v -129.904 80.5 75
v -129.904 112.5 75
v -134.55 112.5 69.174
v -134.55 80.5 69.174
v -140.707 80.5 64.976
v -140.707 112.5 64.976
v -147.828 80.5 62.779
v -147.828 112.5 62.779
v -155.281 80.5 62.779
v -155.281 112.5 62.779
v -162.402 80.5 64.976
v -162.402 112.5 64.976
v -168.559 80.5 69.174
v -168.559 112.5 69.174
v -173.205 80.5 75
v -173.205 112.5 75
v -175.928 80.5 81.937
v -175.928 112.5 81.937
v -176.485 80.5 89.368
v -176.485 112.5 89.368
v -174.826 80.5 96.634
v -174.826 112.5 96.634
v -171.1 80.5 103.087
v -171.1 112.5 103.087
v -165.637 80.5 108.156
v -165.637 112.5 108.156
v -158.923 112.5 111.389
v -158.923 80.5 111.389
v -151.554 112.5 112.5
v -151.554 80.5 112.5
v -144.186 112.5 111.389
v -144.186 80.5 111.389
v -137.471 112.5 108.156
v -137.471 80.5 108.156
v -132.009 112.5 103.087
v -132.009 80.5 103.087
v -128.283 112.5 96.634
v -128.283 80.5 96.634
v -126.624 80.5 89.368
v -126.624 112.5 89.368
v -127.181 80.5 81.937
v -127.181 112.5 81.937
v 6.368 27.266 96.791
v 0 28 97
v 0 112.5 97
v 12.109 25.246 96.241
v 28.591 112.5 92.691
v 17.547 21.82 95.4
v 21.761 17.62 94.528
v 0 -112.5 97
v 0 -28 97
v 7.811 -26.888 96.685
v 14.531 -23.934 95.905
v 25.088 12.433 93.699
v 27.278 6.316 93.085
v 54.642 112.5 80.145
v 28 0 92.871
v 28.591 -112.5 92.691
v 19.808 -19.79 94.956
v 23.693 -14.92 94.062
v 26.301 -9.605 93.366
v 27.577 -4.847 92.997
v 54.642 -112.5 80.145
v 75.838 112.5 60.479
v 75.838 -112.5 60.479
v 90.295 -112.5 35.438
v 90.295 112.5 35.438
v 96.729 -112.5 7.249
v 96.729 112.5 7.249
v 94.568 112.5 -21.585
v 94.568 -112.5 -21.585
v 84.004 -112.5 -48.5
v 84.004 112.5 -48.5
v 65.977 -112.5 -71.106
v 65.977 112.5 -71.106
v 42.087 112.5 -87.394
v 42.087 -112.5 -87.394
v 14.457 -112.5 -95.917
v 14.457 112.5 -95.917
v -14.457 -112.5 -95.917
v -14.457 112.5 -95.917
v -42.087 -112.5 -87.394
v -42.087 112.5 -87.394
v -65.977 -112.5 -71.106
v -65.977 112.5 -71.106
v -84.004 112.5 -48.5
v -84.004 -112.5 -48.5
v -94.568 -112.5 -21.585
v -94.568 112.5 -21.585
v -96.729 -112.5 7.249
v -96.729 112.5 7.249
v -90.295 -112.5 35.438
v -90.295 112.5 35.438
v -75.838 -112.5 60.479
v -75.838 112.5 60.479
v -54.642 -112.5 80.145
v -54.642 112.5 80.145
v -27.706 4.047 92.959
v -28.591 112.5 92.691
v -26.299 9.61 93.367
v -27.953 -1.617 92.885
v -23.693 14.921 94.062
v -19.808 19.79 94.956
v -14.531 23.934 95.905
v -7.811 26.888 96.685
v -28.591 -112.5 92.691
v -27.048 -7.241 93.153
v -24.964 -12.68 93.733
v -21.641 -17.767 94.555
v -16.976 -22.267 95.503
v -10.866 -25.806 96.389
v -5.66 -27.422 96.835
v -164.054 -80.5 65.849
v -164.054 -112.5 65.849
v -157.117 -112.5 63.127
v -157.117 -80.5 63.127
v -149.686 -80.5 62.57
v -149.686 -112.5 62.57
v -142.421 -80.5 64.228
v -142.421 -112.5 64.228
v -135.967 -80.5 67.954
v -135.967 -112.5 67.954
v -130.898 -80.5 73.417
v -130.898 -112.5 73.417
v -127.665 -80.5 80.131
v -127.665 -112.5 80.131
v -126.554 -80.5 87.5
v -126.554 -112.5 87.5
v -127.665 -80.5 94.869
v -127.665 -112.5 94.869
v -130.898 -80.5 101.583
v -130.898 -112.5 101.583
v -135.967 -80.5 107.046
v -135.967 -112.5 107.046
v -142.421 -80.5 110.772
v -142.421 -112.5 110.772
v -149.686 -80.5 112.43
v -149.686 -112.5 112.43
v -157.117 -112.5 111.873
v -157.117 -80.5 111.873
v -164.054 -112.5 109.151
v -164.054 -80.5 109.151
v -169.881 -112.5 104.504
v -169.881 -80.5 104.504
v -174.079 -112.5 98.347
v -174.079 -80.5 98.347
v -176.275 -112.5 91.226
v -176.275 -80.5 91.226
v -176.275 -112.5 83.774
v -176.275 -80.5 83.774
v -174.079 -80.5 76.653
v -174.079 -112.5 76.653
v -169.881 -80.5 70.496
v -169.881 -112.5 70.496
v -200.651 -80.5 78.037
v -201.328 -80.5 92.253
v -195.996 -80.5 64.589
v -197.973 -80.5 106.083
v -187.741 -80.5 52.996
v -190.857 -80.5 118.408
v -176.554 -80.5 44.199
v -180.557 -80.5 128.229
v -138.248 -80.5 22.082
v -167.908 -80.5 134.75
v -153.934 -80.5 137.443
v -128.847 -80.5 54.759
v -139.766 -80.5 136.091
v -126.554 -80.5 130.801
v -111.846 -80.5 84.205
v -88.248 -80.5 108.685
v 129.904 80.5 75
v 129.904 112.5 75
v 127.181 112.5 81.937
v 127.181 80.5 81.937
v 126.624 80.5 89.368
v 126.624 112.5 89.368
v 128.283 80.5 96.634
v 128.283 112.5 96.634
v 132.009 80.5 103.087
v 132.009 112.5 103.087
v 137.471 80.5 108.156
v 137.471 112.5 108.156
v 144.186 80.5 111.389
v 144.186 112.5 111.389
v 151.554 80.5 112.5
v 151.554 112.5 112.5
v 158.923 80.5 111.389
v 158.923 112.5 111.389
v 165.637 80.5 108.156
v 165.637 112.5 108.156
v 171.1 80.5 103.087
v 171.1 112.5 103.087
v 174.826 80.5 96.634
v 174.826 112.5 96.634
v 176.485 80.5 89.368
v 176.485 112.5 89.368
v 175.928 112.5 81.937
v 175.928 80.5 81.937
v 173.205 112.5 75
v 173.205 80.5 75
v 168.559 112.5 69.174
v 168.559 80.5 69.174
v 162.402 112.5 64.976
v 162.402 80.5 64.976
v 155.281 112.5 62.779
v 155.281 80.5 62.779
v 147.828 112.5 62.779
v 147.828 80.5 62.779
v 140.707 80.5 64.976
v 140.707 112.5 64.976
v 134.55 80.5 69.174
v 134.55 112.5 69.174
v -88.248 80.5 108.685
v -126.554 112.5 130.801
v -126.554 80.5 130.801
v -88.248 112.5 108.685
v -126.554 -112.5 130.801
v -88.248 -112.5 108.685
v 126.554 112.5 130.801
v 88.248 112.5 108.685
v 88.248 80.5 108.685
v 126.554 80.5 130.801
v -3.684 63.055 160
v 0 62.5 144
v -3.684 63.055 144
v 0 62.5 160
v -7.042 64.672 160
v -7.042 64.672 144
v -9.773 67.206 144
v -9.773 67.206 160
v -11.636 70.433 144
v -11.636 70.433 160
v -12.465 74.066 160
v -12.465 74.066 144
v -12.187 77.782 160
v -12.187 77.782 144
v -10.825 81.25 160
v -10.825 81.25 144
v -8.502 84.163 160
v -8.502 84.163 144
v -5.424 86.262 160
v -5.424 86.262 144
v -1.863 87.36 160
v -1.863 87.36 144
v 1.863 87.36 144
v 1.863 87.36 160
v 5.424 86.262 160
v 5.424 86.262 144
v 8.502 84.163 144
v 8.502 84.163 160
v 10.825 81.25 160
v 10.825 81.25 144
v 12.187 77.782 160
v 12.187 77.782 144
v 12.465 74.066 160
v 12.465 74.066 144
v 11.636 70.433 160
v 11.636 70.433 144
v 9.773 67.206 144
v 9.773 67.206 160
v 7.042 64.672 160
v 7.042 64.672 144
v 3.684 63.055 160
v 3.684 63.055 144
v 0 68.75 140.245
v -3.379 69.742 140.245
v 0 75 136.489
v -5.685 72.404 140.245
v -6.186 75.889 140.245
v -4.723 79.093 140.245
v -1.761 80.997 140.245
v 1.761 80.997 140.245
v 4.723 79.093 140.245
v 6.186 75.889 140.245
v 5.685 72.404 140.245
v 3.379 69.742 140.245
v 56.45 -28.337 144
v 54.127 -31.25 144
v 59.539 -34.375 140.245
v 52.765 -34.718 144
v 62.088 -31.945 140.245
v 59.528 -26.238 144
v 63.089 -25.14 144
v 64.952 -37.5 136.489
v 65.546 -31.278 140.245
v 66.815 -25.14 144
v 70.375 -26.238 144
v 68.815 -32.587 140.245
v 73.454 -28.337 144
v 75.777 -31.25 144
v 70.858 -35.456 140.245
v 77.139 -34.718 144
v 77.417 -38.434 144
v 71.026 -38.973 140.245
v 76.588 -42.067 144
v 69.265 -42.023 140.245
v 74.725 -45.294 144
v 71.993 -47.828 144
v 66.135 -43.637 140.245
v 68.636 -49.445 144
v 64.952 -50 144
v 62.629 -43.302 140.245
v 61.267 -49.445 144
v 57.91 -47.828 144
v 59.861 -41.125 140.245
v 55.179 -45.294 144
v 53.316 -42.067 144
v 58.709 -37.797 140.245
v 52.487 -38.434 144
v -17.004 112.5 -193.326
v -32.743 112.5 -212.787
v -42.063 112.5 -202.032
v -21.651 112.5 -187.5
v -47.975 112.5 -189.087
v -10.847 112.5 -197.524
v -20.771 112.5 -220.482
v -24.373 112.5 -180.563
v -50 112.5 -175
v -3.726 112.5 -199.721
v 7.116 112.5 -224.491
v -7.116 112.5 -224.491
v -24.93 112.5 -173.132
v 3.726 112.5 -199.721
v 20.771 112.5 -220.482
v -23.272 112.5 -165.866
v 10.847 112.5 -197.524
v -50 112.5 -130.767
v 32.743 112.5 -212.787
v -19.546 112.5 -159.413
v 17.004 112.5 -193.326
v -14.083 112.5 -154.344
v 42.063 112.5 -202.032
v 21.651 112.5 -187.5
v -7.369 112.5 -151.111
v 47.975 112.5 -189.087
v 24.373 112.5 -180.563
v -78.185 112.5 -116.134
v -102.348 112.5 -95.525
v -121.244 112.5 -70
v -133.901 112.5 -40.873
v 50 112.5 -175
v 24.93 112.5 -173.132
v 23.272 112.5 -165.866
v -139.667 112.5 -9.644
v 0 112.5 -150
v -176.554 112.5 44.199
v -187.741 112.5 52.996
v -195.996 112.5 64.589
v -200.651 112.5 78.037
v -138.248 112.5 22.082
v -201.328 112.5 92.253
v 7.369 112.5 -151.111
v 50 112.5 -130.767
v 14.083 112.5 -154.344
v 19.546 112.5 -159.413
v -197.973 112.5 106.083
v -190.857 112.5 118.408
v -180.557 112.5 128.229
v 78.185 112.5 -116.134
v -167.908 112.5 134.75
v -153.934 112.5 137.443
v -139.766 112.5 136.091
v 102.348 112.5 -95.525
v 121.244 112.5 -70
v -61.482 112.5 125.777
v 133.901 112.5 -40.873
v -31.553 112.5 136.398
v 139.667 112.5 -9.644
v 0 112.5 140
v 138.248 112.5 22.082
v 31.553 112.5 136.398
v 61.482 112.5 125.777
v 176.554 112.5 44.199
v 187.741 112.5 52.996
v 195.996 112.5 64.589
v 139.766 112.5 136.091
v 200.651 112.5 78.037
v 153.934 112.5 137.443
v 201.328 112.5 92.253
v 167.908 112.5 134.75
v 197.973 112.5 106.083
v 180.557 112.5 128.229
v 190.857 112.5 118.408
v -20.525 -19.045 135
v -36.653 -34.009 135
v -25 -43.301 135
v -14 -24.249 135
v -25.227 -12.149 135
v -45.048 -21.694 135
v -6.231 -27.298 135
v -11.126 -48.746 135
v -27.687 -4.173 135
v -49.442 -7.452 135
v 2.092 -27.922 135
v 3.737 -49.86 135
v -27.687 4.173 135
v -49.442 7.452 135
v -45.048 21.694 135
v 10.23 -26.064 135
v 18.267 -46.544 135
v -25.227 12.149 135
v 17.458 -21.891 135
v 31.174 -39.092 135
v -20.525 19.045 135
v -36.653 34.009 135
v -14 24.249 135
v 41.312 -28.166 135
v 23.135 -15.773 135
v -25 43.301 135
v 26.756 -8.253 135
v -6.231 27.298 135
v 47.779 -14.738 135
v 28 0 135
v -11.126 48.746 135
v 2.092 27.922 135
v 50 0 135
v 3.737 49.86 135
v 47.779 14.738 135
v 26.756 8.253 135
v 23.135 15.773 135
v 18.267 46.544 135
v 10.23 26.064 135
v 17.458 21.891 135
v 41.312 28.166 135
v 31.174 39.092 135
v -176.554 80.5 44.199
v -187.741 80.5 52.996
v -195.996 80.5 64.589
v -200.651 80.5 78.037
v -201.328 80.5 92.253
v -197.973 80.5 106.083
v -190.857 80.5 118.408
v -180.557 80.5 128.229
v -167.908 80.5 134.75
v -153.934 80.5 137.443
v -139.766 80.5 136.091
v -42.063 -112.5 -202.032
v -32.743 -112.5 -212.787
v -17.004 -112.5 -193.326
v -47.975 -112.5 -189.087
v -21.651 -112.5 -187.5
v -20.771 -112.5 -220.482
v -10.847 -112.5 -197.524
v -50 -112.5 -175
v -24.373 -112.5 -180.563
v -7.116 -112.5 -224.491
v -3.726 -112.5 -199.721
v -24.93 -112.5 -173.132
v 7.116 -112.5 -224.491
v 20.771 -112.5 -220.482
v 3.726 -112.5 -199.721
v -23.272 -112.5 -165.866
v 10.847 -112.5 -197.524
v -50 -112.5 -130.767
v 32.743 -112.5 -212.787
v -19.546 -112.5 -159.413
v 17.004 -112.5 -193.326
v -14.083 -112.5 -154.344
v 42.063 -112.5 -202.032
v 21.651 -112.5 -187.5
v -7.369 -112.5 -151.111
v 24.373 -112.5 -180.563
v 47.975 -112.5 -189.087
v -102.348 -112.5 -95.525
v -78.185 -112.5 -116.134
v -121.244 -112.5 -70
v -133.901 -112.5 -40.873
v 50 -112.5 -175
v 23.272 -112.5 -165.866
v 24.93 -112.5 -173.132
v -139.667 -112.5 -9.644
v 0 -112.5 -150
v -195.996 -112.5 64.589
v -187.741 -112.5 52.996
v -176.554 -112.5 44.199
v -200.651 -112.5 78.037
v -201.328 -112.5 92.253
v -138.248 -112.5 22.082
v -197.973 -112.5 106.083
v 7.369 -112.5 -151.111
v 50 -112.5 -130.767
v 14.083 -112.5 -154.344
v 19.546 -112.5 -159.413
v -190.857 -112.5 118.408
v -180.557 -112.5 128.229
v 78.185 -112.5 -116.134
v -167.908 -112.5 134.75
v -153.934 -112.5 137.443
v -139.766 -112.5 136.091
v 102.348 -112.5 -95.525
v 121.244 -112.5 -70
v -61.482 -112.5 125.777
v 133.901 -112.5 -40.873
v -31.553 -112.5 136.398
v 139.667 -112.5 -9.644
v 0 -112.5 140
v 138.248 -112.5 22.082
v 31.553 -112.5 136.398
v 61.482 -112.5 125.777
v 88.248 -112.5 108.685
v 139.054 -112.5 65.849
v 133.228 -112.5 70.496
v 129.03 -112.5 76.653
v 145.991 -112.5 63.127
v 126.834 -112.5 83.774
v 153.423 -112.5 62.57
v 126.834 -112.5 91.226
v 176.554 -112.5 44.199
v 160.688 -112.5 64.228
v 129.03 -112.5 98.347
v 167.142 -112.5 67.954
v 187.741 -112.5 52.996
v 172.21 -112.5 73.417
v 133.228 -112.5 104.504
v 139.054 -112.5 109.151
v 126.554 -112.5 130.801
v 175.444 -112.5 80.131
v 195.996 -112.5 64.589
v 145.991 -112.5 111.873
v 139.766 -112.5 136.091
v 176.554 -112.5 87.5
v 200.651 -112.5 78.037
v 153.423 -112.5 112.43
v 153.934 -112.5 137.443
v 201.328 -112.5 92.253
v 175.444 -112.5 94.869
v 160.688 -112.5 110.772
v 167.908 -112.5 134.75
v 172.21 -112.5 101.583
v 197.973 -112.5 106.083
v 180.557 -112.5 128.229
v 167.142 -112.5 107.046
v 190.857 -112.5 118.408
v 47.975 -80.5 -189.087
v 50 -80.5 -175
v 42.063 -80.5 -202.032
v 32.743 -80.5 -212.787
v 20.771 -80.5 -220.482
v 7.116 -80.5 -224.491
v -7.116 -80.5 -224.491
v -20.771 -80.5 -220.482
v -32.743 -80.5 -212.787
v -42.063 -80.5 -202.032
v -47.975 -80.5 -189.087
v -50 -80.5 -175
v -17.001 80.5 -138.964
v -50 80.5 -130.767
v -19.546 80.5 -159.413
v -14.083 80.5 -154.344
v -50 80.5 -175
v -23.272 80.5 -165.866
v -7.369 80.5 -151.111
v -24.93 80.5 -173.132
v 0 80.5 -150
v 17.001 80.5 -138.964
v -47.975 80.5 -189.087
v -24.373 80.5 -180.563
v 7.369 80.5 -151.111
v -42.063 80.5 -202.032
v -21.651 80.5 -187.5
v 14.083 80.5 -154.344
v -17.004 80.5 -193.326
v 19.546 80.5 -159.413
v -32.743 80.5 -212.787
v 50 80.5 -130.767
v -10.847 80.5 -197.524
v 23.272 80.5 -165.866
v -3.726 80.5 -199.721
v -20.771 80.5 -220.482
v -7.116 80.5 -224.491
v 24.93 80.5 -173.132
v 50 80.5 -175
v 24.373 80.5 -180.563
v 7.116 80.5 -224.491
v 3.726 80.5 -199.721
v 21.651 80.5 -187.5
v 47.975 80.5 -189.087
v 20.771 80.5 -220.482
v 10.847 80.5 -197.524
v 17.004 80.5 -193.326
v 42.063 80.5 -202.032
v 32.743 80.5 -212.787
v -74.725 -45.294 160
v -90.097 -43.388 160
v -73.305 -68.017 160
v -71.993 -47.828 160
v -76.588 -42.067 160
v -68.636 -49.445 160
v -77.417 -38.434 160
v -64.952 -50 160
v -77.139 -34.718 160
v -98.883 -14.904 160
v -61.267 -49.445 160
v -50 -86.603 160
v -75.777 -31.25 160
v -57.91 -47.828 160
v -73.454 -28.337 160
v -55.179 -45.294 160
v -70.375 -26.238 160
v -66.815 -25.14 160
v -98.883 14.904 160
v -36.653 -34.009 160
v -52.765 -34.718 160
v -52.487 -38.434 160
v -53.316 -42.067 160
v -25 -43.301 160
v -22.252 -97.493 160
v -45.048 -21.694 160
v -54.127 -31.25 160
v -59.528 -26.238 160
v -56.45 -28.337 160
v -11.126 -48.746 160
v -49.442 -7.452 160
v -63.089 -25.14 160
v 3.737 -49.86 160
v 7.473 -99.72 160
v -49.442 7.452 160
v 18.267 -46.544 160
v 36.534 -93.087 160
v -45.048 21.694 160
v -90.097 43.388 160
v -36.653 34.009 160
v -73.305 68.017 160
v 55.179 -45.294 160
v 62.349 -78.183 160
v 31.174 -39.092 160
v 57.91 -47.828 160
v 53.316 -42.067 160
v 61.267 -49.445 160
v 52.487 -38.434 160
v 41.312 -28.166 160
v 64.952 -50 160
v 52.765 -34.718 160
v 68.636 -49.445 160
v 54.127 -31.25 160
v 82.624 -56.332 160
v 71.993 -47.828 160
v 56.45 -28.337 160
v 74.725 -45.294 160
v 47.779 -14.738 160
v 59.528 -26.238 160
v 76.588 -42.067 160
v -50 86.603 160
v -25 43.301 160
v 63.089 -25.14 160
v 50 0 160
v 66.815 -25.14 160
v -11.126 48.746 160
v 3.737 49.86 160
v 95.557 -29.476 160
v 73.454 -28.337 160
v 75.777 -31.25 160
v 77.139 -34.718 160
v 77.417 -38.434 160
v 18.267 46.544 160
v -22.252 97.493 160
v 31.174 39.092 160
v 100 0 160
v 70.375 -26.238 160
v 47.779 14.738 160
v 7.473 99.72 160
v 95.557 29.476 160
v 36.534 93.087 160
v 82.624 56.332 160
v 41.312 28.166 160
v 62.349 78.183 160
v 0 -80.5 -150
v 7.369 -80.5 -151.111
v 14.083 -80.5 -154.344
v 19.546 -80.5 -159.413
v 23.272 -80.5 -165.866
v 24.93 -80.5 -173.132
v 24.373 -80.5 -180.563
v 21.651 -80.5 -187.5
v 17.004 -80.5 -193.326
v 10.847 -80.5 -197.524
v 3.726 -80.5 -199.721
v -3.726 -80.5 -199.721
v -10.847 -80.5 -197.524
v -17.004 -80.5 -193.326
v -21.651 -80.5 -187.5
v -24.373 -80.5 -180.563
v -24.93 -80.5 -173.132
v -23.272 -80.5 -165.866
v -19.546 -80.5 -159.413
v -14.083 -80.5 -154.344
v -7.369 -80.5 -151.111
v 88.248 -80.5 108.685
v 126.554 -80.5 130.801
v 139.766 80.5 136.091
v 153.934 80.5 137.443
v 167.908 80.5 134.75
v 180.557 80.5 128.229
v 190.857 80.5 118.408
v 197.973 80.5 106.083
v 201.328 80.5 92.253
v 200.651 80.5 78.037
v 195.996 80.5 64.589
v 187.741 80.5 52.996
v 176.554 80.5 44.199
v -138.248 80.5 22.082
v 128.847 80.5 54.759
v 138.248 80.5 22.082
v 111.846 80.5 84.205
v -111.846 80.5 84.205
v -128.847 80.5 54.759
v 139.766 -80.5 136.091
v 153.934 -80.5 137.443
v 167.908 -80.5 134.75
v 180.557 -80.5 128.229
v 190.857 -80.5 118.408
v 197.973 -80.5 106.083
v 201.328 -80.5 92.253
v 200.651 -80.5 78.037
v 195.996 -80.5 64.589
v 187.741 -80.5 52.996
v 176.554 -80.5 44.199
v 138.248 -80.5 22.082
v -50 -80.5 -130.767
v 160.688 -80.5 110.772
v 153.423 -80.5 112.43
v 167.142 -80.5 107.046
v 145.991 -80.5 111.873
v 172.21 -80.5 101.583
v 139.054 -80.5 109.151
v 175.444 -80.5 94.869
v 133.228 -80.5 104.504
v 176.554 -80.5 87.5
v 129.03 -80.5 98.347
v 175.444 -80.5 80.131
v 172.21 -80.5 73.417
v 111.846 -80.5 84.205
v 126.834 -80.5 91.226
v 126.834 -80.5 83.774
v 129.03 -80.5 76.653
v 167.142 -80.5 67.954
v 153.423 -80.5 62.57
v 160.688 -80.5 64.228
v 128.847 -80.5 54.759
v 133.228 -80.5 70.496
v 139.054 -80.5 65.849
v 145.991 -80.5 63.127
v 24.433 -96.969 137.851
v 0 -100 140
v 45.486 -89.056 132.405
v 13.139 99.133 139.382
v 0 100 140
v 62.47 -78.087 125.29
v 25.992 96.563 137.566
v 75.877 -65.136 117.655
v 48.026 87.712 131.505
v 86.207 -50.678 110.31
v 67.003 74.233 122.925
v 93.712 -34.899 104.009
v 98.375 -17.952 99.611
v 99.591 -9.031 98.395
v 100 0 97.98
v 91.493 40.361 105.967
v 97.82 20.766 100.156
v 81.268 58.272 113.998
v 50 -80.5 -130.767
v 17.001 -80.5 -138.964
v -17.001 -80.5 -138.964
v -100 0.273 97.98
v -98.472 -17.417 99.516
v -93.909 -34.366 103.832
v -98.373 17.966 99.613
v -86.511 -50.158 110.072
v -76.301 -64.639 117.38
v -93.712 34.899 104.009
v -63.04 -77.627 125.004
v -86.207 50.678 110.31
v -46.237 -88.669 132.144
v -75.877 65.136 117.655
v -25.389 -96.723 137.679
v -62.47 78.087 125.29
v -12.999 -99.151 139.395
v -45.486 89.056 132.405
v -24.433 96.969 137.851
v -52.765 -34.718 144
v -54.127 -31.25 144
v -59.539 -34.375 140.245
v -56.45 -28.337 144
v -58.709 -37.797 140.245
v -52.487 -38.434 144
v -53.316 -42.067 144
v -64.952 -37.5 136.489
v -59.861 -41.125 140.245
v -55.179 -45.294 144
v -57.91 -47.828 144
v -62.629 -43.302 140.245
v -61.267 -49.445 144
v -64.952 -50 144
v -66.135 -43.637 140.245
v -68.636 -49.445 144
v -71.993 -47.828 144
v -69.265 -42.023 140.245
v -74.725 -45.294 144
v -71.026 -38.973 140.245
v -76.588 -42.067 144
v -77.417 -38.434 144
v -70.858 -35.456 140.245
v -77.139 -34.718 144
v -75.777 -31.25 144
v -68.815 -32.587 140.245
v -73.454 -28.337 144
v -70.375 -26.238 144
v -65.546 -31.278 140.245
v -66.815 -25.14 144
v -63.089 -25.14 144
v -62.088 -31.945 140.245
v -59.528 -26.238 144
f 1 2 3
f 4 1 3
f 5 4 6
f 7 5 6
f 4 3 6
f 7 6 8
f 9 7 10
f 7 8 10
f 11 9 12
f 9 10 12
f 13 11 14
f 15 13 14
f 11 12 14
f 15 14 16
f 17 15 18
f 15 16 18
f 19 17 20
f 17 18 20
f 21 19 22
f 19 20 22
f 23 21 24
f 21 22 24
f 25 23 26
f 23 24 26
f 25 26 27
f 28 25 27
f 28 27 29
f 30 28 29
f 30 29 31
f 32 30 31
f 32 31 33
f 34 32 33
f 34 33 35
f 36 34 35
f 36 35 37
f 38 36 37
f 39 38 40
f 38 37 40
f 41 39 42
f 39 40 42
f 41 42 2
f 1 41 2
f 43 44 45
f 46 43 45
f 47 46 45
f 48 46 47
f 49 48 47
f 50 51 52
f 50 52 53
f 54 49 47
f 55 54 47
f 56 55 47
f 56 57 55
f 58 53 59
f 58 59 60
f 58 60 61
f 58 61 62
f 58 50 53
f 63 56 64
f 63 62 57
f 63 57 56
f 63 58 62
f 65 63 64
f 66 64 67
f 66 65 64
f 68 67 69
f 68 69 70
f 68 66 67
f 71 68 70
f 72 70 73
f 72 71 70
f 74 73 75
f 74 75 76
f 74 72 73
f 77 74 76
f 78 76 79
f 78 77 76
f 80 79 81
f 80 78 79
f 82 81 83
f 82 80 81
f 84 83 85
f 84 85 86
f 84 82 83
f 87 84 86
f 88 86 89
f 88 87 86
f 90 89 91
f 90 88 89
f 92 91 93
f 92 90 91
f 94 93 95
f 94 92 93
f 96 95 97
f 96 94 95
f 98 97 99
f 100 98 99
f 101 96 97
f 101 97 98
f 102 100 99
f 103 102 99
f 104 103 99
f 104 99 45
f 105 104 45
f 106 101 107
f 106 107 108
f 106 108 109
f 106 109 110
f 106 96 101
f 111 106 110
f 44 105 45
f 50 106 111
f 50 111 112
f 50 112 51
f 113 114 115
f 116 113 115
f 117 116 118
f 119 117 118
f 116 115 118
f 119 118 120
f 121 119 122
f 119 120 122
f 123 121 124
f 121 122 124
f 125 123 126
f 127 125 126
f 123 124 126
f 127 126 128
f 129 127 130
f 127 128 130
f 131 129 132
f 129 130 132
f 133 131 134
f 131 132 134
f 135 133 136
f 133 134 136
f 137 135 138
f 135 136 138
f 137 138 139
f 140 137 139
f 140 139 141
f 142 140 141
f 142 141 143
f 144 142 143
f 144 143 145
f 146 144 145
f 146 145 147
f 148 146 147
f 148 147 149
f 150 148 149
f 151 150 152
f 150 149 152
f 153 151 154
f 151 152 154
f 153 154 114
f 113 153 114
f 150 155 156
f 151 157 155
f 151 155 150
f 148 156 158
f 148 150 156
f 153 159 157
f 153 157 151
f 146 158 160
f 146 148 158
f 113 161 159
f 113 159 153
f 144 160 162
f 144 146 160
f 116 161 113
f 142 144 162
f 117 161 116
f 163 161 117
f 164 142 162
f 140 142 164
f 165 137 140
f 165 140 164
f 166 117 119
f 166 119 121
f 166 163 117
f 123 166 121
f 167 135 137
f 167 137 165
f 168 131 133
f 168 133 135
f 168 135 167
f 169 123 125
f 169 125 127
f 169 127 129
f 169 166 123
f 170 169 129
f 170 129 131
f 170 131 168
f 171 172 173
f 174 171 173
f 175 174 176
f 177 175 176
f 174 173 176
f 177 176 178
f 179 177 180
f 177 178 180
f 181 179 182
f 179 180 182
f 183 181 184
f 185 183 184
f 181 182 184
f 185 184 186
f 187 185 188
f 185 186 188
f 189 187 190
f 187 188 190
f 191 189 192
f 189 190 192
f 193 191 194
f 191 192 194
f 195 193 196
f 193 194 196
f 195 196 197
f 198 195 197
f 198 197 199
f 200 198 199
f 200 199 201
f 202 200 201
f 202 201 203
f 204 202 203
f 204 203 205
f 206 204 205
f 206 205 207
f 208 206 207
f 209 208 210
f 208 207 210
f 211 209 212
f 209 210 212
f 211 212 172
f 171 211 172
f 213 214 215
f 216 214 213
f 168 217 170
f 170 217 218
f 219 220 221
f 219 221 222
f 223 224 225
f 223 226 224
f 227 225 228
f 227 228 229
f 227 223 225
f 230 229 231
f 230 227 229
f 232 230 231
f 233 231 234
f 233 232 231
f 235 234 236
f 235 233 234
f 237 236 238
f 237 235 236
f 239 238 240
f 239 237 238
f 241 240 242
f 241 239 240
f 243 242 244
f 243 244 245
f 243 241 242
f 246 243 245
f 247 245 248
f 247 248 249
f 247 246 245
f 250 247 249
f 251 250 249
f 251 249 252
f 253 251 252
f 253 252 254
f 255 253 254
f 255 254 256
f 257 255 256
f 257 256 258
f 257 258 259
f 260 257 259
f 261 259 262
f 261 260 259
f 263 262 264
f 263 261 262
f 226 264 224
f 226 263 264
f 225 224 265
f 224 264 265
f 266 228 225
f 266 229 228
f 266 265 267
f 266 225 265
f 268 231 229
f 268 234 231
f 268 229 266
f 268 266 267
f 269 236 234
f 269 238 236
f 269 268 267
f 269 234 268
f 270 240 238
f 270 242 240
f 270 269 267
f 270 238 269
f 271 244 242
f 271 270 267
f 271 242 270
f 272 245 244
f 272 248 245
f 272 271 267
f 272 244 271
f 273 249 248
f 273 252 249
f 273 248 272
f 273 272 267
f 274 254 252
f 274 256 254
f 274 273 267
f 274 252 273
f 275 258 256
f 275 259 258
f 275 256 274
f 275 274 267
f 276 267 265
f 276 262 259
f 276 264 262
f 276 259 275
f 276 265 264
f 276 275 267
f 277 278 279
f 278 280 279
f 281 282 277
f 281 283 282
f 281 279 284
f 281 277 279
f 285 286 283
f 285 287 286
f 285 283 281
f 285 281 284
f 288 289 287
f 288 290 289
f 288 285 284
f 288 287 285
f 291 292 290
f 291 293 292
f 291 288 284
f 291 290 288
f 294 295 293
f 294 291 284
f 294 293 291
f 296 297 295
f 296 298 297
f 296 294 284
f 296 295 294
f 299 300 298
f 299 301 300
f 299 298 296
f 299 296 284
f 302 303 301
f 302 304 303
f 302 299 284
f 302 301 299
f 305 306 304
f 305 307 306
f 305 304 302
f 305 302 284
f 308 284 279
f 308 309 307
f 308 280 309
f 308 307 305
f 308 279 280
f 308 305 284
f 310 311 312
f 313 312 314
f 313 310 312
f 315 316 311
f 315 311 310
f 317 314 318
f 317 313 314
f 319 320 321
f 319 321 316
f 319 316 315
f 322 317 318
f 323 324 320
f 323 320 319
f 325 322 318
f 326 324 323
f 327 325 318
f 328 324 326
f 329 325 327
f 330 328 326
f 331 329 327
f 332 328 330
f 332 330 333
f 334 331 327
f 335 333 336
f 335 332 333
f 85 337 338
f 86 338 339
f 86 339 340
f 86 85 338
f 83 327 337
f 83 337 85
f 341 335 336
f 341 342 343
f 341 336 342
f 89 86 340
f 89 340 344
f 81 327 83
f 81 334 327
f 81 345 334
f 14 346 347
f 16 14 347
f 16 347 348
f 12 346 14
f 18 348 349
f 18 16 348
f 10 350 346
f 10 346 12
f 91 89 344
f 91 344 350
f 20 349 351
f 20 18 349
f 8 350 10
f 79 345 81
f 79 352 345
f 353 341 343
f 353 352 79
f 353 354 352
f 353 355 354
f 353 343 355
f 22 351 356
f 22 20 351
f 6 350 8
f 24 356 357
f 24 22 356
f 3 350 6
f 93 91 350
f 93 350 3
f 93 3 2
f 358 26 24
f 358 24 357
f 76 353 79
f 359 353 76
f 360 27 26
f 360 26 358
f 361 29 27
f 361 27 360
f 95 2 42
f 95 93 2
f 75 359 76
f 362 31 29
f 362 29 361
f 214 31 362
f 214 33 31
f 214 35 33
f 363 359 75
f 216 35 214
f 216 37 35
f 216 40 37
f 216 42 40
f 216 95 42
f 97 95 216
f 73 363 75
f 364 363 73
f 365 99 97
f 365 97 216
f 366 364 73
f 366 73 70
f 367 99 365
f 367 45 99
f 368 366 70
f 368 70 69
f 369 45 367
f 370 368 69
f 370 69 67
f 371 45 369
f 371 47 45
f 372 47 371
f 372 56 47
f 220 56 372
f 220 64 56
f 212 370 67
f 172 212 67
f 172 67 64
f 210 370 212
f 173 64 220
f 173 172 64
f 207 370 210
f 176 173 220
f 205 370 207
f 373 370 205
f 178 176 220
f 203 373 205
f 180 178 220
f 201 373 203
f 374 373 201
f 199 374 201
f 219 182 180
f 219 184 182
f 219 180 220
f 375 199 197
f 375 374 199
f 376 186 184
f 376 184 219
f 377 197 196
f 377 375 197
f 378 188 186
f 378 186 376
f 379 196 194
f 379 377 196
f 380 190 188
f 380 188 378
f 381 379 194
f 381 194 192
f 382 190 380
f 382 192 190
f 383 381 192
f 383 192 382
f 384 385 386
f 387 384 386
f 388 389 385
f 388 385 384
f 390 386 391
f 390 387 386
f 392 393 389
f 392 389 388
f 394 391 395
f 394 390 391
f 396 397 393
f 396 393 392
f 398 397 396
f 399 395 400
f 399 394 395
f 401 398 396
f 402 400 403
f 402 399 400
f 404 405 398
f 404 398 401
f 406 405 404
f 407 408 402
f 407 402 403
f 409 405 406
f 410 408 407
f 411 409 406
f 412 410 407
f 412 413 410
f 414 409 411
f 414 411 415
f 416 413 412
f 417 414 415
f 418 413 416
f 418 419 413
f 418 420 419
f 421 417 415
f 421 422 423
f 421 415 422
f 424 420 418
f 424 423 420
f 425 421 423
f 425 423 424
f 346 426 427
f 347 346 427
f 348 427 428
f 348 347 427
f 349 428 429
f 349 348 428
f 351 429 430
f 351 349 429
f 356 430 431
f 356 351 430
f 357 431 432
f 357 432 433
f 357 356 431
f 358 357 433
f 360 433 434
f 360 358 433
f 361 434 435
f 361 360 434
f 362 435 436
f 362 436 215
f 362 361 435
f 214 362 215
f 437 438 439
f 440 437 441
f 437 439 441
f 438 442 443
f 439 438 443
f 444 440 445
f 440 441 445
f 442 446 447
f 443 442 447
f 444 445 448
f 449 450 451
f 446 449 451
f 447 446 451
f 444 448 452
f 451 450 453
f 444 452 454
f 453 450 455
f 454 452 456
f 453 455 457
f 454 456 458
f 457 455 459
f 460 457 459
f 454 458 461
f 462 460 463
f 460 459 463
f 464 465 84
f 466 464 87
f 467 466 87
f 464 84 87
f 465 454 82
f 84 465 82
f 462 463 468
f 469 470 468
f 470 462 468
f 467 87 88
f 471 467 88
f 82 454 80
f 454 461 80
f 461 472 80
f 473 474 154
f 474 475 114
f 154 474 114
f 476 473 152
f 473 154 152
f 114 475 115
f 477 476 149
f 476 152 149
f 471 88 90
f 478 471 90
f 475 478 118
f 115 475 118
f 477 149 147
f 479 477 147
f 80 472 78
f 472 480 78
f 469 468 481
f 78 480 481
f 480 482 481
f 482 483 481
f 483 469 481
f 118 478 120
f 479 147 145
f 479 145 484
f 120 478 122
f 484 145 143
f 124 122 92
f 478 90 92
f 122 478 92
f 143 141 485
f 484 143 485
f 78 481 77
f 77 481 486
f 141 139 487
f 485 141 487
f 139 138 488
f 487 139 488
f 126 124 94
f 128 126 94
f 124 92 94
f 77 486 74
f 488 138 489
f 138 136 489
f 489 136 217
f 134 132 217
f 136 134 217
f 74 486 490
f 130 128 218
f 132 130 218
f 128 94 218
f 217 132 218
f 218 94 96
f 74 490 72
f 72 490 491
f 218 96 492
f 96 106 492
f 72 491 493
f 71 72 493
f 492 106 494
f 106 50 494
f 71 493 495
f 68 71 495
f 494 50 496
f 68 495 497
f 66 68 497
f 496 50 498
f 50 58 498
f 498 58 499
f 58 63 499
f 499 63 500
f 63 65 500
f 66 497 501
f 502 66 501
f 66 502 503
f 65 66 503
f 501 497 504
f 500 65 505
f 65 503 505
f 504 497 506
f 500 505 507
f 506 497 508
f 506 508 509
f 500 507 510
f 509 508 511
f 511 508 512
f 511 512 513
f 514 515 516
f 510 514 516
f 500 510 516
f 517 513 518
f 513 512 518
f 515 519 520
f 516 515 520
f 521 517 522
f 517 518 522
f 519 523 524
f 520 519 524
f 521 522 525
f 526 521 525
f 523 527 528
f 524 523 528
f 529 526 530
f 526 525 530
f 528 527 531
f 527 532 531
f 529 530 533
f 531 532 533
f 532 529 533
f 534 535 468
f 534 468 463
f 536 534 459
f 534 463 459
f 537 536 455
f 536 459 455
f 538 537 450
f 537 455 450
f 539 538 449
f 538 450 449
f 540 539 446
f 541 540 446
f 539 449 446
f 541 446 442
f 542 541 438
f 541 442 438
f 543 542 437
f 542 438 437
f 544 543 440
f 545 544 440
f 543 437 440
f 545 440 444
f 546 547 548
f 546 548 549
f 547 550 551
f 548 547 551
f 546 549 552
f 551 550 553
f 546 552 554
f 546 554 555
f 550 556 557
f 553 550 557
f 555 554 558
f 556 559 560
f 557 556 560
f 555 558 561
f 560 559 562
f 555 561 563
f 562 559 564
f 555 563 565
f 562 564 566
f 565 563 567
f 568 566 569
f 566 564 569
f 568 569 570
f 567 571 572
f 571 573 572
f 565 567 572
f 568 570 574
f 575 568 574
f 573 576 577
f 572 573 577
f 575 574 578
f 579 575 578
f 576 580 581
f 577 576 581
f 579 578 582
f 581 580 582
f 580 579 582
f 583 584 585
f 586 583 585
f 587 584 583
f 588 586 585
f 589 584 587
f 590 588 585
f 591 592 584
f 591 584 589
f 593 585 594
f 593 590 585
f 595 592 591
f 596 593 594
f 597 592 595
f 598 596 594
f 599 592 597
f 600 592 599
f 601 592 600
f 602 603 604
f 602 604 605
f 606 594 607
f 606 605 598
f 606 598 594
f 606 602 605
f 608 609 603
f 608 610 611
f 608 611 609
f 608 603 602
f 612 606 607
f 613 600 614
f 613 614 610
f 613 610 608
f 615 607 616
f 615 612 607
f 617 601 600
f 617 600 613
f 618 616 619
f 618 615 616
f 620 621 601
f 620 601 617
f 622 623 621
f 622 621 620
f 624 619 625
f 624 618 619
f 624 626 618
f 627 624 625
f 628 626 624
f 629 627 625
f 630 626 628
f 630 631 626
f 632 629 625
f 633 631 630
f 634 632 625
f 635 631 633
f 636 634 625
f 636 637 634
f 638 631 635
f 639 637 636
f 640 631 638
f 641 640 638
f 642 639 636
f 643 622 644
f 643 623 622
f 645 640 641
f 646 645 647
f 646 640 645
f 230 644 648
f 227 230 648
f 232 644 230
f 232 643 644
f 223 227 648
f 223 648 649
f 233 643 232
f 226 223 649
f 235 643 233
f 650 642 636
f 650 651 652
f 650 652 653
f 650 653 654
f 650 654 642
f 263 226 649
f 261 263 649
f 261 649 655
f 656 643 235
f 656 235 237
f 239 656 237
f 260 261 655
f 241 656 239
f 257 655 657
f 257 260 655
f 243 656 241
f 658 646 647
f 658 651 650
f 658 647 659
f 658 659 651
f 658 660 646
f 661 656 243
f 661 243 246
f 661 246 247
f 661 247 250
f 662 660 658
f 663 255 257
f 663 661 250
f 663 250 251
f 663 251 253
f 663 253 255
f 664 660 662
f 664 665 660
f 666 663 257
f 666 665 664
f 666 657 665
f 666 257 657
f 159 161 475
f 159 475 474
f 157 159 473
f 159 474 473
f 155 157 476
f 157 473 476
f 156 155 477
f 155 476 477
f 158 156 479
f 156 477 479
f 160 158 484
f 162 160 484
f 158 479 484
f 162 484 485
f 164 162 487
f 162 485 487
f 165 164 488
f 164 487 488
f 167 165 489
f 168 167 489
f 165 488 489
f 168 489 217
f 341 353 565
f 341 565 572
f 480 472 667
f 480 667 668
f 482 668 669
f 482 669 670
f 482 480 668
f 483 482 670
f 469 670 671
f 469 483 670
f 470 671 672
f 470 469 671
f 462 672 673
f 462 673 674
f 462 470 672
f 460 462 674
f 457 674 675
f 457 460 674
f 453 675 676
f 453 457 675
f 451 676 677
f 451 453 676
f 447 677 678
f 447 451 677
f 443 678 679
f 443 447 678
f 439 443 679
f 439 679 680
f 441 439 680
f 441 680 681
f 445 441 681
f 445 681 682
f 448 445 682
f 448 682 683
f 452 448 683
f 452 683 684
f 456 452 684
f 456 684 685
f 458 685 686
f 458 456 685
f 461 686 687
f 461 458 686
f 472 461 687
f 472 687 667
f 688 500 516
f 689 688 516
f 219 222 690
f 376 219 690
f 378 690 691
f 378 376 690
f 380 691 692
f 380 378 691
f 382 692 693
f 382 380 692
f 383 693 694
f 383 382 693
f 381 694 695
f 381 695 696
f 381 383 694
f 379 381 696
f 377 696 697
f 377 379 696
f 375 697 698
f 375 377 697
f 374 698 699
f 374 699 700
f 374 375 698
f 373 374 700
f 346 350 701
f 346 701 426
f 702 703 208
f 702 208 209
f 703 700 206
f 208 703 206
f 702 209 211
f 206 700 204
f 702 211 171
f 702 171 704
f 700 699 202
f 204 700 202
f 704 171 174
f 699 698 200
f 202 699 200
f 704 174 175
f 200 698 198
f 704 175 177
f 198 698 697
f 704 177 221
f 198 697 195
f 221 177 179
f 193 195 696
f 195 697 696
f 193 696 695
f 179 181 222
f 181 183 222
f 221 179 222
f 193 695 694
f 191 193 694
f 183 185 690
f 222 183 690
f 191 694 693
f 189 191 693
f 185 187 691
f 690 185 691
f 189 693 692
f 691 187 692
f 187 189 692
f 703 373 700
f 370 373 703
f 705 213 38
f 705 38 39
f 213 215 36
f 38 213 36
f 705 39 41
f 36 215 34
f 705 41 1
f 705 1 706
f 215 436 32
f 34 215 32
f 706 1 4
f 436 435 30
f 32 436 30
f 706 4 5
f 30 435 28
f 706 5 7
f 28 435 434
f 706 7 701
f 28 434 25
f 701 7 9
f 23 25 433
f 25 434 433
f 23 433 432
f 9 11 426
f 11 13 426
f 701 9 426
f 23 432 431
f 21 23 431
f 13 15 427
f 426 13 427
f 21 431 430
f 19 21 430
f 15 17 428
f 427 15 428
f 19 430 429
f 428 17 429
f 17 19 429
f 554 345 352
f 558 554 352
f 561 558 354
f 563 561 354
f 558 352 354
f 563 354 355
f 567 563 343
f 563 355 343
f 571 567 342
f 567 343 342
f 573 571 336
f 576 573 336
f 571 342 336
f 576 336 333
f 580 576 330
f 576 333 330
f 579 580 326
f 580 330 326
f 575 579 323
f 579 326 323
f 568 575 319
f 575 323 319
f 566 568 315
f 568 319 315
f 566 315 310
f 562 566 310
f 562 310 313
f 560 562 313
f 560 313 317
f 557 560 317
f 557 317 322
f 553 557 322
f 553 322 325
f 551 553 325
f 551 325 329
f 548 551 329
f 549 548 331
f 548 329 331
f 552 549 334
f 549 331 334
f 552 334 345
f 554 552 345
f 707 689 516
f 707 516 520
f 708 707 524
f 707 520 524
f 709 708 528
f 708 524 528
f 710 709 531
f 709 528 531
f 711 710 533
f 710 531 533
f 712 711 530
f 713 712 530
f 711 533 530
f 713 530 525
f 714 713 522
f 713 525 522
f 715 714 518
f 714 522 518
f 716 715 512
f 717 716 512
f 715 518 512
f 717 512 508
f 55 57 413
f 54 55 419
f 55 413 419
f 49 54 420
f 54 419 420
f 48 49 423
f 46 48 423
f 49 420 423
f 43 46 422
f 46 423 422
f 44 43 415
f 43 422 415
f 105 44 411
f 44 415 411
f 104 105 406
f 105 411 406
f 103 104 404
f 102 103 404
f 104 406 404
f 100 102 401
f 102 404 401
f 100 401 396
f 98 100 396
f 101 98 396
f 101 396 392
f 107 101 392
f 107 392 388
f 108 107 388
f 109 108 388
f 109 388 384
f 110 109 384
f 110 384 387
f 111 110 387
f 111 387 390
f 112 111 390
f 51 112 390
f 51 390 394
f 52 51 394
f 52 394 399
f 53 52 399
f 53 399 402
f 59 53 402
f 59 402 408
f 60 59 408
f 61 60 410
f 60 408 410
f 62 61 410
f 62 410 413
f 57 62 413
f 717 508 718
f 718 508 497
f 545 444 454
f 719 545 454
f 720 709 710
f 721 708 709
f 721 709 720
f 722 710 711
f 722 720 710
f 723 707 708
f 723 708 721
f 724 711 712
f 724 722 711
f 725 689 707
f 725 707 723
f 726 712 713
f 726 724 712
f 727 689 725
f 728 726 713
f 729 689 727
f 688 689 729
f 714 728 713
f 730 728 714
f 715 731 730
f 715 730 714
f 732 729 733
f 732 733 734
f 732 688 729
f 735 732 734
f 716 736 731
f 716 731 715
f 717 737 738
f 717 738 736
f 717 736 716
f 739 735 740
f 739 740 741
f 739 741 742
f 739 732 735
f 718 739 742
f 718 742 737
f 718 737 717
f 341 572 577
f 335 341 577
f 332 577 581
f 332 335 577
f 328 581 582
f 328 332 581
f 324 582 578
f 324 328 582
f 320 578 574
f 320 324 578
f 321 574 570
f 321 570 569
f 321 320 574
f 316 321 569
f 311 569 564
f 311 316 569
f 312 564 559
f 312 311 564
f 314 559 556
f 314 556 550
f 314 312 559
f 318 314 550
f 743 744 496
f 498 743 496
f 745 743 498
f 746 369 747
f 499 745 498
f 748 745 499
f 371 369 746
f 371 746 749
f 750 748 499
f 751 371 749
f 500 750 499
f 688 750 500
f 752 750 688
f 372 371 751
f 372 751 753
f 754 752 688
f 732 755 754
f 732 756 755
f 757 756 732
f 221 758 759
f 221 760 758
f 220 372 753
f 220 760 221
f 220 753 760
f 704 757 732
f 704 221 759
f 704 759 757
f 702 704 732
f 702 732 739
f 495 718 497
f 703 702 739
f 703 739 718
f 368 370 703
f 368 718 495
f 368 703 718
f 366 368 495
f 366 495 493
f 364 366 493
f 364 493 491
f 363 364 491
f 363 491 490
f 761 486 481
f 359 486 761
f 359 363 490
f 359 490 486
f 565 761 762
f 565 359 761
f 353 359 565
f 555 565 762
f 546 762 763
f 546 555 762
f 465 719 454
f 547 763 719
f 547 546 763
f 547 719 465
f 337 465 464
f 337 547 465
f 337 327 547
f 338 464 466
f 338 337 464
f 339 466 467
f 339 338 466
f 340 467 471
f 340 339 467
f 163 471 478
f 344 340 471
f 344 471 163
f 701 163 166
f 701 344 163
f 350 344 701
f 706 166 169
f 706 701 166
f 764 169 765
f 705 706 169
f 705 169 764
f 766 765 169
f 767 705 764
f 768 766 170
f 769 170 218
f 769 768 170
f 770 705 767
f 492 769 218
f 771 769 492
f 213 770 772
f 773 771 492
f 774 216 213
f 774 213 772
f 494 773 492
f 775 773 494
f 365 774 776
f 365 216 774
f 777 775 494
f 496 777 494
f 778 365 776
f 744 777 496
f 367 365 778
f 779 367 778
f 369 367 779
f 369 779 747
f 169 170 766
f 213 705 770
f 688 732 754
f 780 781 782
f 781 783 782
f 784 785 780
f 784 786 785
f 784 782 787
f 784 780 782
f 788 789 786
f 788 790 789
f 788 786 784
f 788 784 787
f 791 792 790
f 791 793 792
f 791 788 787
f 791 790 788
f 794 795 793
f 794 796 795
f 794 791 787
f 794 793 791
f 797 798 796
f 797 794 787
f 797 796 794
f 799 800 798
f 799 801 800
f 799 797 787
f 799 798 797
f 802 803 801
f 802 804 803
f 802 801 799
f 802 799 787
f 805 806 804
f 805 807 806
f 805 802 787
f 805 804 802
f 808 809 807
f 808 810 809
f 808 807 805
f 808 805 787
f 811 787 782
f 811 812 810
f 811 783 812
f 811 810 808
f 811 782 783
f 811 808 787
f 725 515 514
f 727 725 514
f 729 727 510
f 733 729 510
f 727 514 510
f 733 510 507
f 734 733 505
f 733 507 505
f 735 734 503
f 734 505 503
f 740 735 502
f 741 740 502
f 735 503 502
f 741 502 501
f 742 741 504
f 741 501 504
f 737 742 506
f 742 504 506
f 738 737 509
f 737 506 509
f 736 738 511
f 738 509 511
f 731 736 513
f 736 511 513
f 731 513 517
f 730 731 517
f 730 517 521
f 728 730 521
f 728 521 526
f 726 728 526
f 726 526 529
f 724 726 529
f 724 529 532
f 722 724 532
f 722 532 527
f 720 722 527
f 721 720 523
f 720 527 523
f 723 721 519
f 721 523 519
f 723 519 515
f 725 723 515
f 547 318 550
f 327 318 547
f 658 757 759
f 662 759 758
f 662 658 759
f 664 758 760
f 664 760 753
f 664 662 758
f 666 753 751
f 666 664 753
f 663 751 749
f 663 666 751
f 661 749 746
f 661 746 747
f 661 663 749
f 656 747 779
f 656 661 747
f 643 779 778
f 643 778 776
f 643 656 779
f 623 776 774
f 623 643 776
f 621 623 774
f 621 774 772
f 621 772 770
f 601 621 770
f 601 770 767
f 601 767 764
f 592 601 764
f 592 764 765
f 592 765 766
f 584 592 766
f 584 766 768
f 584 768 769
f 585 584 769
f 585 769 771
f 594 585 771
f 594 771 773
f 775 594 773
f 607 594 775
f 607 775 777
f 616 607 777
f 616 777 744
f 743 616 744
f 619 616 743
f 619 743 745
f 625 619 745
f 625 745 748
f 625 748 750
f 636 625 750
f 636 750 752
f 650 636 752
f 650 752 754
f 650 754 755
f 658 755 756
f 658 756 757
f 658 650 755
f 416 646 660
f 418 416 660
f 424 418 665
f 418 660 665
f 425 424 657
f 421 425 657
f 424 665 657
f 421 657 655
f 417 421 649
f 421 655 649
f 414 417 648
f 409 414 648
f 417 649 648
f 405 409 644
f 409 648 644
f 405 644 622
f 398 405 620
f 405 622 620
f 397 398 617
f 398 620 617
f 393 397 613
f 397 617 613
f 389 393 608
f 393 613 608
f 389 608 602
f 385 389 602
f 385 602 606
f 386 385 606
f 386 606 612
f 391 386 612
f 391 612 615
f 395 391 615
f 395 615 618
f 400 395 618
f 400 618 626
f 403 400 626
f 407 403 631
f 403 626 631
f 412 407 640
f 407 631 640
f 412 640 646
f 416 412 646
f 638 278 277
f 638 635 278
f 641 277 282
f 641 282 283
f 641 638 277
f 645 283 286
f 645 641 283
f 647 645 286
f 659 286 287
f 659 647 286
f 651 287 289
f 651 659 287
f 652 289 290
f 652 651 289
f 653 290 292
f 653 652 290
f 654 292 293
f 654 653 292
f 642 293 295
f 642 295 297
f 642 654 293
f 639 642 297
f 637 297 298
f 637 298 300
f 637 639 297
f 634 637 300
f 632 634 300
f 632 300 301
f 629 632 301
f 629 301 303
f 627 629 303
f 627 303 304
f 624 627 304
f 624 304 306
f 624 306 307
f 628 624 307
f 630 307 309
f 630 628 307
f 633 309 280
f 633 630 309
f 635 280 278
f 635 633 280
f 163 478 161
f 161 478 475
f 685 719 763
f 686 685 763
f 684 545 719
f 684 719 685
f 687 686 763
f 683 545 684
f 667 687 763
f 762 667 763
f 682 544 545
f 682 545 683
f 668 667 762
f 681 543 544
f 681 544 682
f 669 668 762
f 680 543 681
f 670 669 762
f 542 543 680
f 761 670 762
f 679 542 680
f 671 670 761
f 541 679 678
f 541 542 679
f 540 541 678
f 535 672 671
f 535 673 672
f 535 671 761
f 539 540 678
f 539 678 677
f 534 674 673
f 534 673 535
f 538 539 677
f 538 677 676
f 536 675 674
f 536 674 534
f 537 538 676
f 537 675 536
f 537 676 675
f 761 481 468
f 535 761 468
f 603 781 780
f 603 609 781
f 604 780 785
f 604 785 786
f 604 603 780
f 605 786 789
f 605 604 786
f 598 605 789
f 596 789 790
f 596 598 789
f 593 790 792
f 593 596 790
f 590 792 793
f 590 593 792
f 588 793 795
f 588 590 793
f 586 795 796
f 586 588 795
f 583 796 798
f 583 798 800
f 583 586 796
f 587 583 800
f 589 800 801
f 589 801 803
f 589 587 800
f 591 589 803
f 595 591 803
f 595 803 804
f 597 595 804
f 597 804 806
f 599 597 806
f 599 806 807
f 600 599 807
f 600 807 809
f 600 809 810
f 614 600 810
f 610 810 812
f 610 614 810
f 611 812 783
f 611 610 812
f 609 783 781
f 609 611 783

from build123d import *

# Parameters (mm, degrees)
SKETCH1_R                = 140
SKETCH1_R_2              = 97
BOSS_EXTRUDE1_DEPTH      = 112.5
SKETCH2_R                = 25
BOSS_EXTRUDE2_DEPTH      = 32
CIRPATTERN1_COUNT        = 3
MIRROR1_COPY_1_SKETCH_R  = 25
MIRROR1_COPY_1_DEPTH     = 32
MIRROR1_COPY_2_SKETCH_R  = 25
MIRROR1_COPY_2_DEPTH     = 32
BOSS_EXTRUDE3_REACH      = 387
BOSS_EXTRUDE3_END_RADIUS = 140
SKETCH3_R                = 100
CUT_EXTRUDE1_REACH       = 387
CUT_EXTRUDE1_END_RADIUS  = 97
SKETCH4_R                = 28
SKETCH5_R                = 50
CUT_EXTRUDE2_DEPTH       = 25
CIRPATTERN2_COUNT        = 3


with BuildPart() as part:
    # Sketch1 → Boss-Extrude1 (new body, symmetric)
    with BuildSketch(Plane(origin=(0, 0, 0), x_dir=(1, 0, 0), z_dir=(0, 1, 0))):
        with Locations(Location((0, 0, 0), (0, 0, 270))):  # turned: the seam where the file's is
            Circle(SKETCH1_R)
        with Locations(Location((0, 0, 0), (0, 0, 270))):  # turned: the seam where the file's is
            Circle(SKETCH1_R_2, mode=Mode.SUBTRACT)
    extrude(amount=BOSS_EXTRUDE1_DEPTH, both=True)

    # Sketch2 → Boss-Extrude2 (add)
    with BuildSketch(Plane(origin=(0, 112.5, 0), x_dir=(1, 0, 0), z_dir=(0, 1, 0))):
        with BuildLine():
            Line((-50, 175), (-50, 130.766968306))
            ThreePointArc((-50, 130.766968306), (0, 140), (50, 130.766968306))
            Line((50, 130.766968306), (50, 175))
            ThreePointArc((50, 175), (0, 225), (-50, 175))
        make_face()
        with Locations(Location((0, 175, 0), (0, 0, 270))):  # turned: the seam where the file's is
            Circle(SKETCH2_R, mode=Mode.SUBTRACT)
    boss_extrude2 = extrude(amount=-BOSS_EXTRUDE2_DEPTH)

    # CirPattern1: Boss-Extrude2 ×3 about axis
    cirpattern1_axis = Axis((0, 0, 0), (0, 1, 0))
    for i in range(1, CIRPATTERN1_COUNT):
        add(boss_extrude2.rotate(cirpattern1_axis, i * 360 / CIRPATTERN1_COUNT))

    # Mirror1: Boss-Extrude2 across plane
    add(boss_extrude2.mirror(Plane.ZX))

    # Mirror1 copy 1 sketch → Mirror1 copy 1 (add)
    with BuildSketch(Plane(origin=(0, -112.5, 0), x_dir=(-0.5, 0, -0.866025404), z_dir=(0, -1, 0))):
        with BuildLine():
            Line((-50, -175), (-50, -130.766968306))
            ThreePointArc((-50, -130.766968306), (0, -140), (50, -130.766968306))
            Line((50, -130.766968306), (50, -175))
            ThreePointArc((50, -175), (0, -225), (-50, -175))
        make_face()
        with Locations((0, -175)):
            Circle(MIRROR1_COPY_1_SKETCH_R, mode=Mode.SUBTRACT)
    extrude(amount=-MIRROR1_COPY_1_DEPTH)

    # Mirror1 copy 2 sketch → Mirror1 copy 2 (add)
    with BuildSketch(Plane(origin=(0, -112.5, 0), x_dir=(-0.5, 0, 0.866025404), z_dir=(0, -1, 0))):
        with BuildLine():
            Line((-50, -175), (-50, -130.766968306))
            ThreePointArc((-50, -130.766968306), (0, -140), (50, -130.766968306))
            Line((50, -130.766968306), (50, -175))
            ThreePointArc((50, -175), (0, -225), (-50, -175))
        make_face()
        with Locations((0, -175)):
            Circle(MIRROR1_COPY_2_SKETCH_R, mode=Mode.SUBTRACT)
    extrude(amount=-MIRROR1_COPY_2_DEPTH)

    # Boss-Extrude3: up to this cylinder (the profile starts outside it)
    boss_extrude3_end = Plane(origin=(0, 0, 0), z_dir=(0, -1, 0)) * Cylinder(BOSS_EXTRUDE3_END_RADIUS, 1055, mode=Mode.PRIVATE)
    # Sketch3 → Boss-Extrude3 (add, up to the surface)
    with BuildSketch(Plane.XY.offset(160), mode=Mode.PRIVATE) as boss_extrude3_sk1:
        Circle(SKETCH3_R)
    boss_extrude3_tool1 = extrude(boss_extrude3_sk1.sketch, amount=-BOSS_EXTRUDE3_REACH, mode=Mode.PRIVATE) - boss_extrude3_end
    add(boss_extrude3_tool1.solids().sort_by_distance((0, 0, 160))[0])

    # Cut-Extrude1: up to this cylinder (the profile starts outside it)
    cut_extrude1_end = Plane(origin=(0, 0, 0), z_dir=(0, -1, 0)) * Cylinder(CUT_EXTRUDE1_END_RADIUS, 969, mode=Mode.PRIVATE)
    # Sketch4 → Cut-Extrude1 (cut, up to the surface)
    with BuildSketch(Plane.XY.offset(160), mode=Mode.PRIVATE) as cut_extrude1_sk1:
        Circle(SKETCH4_R)
    cut_extrude1_tool1 = extrude(cut_extrude1_sk1.sketch, amount=-CUT_EXTRUDE1_REACH, mode=Mode.PRIVATE) - cut_extrude1_end
    add(cut_extrude1_tool1.solids().sort_by_distance((0, 0, 160))[0], mode=Mode.SUBTRACT)

    # Sketch5 → Cut-Extrude2 (cut)
    with BuildSketch(Plane.XY.offset(160)):
        Circle(SKETCH5_R)
    extrude(amount=-CUT_EXTRUDE2_DEPTH, mode=Mode.SUBTRACT)

    # Sketch7 → Ø25.0mm Dowel Hole1 (revolve, cut)
    with BuildSketch(Plane(origin=(0, 75, 160), x_dir=(0, -1, 0), z_dir=(1, 0, 0))):
        Polygon((0, 0), (0, 23.510757738), (12.5, 16), (12.5, 0), align=None)
    f_25_0mm_dowel_hole1 = revolve(axis=Axis((0, 75, 166.35), (0, 0, -1)), mode=Mode.SUBTRACT)

    # CirPattern2: Ø25.0mm Dowel Hole1 ×3 about axis
    cirpattern2_axis = Axis((0, 0, 0), (0, 0, 1))
    for i in range(1, CIRPATTERN2_COUNT):
        add(f_25_0mm_dowel_hole1.rotate(cirpattern2_axis, i * 360 / CIRPATTERN2_COUNT), mode=Mode.SUBTRACT)


solid = part.part
